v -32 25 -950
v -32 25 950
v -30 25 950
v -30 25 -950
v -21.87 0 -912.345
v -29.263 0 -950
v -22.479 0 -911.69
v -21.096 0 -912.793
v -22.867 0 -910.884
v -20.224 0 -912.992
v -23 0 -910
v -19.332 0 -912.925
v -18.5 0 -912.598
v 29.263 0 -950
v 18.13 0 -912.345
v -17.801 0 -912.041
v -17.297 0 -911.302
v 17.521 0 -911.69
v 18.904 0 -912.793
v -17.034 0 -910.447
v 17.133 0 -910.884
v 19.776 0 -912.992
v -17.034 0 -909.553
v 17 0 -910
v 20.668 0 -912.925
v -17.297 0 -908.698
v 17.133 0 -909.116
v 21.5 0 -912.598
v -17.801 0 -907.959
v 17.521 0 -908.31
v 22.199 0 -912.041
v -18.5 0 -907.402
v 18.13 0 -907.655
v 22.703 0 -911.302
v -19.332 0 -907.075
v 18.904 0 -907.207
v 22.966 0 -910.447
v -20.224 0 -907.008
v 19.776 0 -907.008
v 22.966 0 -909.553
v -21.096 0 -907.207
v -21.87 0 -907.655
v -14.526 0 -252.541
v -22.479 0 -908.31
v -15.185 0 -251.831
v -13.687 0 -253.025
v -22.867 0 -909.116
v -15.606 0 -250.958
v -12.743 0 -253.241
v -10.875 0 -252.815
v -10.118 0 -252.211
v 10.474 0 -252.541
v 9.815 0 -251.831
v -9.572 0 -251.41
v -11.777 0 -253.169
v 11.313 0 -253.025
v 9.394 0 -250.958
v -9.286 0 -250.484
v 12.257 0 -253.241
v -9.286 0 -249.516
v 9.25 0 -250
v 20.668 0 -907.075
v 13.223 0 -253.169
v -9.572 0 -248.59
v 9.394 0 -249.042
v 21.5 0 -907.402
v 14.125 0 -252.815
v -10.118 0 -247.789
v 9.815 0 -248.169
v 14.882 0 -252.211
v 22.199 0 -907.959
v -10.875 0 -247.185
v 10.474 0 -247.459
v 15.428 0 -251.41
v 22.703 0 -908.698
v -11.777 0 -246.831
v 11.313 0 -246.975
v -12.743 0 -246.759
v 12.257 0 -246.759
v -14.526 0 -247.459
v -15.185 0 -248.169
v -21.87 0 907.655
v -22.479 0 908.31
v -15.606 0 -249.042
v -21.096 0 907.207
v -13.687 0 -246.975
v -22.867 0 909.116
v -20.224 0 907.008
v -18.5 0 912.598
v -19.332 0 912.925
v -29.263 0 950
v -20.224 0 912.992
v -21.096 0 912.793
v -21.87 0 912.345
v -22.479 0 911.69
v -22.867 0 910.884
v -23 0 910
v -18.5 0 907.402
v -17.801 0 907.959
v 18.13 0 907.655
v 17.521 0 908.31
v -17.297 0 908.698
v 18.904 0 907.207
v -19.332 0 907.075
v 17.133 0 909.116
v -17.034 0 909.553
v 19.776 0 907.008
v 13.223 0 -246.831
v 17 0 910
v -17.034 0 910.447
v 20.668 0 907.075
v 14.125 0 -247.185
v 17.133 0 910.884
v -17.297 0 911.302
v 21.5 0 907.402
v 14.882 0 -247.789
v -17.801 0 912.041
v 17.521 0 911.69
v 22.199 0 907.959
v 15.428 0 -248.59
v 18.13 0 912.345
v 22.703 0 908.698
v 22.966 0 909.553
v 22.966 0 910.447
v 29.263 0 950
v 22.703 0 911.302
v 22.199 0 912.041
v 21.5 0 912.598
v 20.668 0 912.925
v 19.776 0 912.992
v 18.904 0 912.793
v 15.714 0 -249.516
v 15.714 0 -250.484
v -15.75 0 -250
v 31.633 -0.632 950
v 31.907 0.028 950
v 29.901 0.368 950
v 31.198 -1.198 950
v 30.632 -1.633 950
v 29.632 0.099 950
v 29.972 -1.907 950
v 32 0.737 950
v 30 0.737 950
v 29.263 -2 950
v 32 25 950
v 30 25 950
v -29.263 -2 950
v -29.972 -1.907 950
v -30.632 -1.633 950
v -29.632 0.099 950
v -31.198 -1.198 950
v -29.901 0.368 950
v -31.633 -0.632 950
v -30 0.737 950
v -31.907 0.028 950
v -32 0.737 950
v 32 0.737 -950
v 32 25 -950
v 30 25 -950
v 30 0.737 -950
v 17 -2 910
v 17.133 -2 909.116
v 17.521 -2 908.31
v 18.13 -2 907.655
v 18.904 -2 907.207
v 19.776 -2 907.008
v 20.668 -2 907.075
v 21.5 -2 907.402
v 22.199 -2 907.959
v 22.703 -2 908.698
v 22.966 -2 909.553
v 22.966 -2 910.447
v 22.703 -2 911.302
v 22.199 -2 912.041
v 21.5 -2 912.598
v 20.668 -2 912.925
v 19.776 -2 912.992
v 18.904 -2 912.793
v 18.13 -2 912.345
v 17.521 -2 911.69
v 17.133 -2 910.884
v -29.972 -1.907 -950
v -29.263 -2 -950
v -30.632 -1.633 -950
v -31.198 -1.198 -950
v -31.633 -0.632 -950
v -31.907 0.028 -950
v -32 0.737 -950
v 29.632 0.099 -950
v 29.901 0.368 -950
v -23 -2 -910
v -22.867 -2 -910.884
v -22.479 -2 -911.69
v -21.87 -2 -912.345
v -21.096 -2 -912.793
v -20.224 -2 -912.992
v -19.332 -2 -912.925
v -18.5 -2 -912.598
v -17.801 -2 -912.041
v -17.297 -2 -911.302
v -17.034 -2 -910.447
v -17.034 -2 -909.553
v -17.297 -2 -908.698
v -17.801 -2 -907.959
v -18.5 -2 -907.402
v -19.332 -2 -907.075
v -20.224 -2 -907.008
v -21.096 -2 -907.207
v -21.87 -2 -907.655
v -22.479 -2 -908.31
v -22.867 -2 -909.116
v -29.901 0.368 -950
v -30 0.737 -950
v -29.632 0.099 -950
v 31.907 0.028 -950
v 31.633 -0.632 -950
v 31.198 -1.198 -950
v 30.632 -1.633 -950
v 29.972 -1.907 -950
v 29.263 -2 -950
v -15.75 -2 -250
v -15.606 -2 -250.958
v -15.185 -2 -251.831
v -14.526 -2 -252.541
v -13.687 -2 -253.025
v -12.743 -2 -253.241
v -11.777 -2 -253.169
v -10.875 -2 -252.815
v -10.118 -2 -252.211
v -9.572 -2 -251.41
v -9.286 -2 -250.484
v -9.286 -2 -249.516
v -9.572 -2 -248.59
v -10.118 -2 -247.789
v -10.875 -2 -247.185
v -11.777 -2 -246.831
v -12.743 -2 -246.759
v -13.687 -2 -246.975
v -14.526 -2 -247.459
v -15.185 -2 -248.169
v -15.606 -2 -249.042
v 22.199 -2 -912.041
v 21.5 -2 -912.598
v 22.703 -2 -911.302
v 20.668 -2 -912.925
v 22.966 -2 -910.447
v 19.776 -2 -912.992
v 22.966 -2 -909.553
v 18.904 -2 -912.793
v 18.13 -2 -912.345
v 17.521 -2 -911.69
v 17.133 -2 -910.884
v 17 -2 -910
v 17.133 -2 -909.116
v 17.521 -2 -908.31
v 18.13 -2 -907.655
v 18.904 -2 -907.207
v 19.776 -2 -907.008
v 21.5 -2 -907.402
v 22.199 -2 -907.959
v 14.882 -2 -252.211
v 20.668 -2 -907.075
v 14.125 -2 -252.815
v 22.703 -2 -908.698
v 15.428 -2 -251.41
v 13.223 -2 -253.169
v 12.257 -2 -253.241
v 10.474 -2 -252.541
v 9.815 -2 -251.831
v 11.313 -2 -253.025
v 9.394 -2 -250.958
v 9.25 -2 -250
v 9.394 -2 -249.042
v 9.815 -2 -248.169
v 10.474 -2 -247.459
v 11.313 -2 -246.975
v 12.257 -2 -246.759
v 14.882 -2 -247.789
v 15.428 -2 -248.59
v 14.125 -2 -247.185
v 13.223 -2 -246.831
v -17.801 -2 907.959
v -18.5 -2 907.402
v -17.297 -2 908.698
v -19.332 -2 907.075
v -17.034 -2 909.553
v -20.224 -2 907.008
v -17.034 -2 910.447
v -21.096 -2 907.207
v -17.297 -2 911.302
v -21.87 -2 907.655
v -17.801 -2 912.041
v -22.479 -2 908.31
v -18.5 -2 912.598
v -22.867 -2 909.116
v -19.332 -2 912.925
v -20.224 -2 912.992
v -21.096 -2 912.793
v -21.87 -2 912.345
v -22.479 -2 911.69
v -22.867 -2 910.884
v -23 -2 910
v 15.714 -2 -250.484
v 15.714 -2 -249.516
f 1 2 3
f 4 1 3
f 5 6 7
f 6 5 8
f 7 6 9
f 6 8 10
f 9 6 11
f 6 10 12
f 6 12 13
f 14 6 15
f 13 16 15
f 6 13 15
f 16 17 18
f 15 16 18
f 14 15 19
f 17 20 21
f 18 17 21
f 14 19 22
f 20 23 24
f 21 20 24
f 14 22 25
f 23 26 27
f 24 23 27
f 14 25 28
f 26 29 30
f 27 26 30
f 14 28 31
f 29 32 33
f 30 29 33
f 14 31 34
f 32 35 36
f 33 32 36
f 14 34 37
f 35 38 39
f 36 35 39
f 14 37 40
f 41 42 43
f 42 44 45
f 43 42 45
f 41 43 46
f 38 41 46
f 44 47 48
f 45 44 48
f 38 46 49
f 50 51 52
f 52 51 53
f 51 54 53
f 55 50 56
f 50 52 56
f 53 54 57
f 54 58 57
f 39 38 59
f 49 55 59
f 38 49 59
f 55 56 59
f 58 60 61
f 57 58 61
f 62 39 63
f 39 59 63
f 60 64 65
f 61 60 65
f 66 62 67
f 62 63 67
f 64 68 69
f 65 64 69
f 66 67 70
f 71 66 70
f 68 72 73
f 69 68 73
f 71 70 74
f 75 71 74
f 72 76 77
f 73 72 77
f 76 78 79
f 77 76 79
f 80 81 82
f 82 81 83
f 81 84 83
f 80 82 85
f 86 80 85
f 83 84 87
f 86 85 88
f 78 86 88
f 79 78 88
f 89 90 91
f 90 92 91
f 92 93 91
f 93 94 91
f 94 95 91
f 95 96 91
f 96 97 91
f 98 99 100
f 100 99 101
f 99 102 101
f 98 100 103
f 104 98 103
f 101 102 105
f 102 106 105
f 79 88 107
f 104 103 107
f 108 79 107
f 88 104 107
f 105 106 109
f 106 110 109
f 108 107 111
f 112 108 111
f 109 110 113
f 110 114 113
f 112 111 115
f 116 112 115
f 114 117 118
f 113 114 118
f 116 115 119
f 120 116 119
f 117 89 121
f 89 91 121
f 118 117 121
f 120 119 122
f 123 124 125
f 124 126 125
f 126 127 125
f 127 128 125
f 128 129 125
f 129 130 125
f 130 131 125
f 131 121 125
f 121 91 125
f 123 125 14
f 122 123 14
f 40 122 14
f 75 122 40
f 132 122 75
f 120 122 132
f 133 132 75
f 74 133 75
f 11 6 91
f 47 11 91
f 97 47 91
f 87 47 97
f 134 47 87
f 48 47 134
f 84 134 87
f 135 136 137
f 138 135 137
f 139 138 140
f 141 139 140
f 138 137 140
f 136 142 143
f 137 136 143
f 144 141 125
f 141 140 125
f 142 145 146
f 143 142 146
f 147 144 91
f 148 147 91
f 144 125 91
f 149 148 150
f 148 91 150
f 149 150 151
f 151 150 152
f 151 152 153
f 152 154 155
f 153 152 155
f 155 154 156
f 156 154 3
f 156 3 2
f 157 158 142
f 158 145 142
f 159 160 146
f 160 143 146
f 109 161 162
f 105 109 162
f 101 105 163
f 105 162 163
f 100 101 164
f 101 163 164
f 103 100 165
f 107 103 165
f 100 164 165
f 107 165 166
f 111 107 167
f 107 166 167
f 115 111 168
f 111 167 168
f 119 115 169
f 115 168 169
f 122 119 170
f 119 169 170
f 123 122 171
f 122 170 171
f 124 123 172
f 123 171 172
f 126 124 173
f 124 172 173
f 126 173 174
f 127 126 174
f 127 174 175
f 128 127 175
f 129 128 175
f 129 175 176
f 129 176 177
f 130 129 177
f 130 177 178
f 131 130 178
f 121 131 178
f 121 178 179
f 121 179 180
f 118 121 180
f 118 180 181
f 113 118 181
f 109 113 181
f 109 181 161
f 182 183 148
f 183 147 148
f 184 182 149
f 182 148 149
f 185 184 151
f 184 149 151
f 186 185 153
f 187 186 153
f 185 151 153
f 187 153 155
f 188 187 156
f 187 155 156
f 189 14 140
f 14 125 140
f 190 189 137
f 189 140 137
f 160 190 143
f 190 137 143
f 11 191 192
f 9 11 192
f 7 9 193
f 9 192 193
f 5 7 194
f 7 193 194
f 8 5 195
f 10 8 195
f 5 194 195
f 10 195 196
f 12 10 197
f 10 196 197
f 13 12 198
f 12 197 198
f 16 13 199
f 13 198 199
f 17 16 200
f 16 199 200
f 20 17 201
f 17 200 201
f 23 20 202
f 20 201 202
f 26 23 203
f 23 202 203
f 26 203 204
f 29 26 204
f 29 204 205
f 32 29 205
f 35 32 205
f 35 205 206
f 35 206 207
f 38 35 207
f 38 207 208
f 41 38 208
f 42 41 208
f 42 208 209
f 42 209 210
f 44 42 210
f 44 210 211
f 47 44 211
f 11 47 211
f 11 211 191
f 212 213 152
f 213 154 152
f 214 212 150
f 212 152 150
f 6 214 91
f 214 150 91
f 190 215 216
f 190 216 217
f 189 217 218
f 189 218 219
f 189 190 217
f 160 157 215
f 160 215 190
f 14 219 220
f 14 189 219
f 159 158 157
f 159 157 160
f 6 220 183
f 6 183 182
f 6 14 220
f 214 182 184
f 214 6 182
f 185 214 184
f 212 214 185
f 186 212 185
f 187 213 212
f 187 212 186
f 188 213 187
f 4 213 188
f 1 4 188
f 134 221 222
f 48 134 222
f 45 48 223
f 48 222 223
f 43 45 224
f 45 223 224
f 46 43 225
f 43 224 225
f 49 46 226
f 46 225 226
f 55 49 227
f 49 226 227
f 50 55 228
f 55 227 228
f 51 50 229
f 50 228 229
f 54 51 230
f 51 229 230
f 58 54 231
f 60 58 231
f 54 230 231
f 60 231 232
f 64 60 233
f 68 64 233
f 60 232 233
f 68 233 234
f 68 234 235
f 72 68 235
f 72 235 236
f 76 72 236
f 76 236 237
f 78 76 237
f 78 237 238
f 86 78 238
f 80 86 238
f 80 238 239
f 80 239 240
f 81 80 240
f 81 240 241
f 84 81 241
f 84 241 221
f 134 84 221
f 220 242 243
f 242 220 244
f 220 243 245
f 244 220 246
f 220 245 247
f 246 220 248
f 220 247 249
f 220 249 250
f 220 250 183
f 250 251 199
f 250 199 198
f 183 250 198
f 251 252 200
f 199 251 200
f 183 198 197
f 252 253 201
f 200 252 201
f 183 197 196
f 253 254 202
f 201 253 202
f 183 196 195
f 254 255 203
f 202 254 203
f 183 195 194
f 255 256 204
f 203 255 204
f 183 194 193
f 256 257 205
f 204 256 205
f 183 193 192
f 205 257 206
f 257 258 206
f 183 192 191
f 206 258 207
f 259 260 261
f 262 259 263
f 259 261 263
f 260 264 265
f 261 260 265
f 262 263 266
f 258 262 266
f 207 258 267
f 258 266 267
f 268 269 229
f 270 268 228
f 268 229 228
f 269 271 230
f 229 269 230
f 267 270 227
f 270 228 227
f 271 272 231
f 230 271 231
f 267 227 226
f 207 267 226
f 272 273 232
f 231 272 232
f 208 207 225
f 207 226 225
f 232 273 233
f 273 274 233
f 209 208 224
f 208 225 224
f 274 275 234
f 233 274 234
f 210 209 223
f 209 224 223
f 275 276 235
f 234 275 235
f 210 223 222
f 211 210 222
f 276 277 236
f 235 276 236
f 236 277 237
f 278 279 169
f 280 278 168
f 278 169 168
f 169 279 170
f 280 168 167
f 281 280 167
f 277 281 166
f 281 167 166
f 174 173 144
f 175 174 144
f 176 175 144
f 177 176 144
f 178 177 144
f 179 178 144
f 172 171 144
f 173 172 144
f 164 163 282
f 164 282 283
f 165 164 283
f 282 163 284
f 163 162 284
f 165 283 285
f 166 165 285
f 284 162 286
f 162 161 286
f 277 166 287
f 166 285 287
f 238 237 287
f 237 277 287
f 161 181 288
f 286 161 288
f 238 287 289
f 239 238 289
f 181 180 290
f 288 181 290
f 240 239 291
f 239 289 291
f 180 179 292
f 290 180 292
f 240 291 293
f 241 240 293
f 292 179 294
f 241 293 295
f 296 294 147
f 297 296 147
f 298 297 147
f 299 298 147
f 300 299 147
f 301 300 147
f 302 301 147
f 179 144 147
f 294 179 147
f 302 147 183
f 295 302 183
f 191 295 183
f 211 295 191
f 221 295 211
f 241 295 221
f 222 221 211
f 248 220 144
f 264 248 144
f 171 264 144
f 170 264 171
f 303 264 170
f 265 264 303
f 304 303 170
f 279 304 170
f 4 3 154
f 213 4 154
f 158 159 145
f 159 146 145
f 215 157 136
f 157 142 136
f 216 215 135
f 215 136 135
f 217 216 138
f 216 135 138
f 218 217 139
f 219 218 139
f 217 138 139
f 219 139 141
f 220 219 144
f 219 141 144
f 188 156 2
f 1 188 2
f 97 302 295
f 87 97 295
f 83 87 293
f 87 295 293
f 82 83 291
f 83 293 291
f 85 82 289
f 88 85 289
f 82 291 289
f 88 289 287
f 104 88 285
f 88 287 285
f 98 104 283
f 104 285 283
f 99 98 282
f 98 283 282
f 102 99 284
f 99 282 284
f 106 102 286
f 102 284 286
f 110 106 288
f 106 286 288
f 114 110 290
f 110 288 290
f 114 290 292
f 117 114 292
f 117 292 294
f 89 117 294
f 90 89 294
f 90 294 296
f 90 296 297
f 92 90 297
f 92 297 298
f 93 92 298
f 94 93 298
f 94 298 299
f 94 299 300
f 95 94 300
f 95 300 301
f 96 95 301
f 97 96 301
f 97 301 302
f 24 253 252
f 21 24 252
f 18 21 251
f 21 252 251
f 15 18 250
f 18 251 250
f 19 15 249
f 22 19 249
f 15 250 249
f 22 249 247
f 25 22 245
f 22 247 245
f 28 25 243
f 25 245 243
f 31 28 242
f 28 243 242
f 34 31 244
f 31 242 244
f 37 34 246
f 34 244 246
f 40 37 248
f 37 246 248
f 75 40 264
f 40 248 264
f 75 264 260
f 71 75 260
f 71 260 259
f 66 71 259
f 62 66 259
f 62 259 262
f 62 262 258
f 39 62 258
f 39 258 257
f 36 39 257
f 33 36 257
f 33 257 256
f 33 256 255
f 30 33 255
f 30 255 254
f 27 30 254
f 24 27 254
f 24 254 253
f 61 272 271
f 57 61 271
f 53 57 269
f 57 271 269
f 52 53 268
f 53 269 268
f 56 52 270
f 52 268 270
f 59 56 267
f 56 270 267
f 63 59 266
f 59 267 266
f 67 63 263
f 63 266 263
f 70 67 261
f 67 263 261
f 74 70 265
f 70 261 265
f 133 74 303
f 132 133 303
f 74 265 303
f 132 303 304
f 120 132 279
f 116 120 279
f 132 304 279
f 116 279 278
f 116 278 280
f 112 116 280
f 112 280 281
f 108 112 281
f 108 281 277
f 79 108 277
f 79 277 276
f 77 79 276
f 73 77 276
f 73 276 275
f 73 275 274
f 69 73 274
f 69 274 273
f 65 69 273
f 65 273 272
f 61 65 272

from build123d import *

# Parameters (mm, degrees)
SM_BASE_FLANGE_1_DEPTH    = 950
HOLE_WIZARD_6_0_6_1_D     = 6
HOLE_WIZARD_6_0_6_1_DEPTH = 15
HOLE_WIZARD_6_0_6_1_TIP   = 1.802581857
HOLE_WIZARD_6_5_6_5_1_D   = 6.5


# Sheet-metal steps are written as plain solids
with BuildPart() as part:
    # Sketch 1 → 基体-法兰1 (new, symmetric)
    with BuildSketch(Plane.XY):
        with BuildLine():
            Line((-30, 25), (-30, 0.7366))
            ThreePointArc((-30, 0.7366), (-29.784254855, 0.215745145), (-29.2634, 0))
            Line((-29.2634, 0), (29.2634, 0))
            ThreePointArc((29.2634, 0), (29.784254855, 0.215745145), (30, 0.7366))
            Line((30, 0.7366), (30, 25))
            Line((30, 25), (32, 25))
            Line((32, 25), (32, 0.7366))
            ThreePointArc((32, 0.7366), (31.198468417, -1.198468417), (29.2634, -2))
            Line((29.2634, -2), (-29.2634, -2))
            ThreePointArc((-29.2634, -2), (-31.198468417, -1.198468417), (-32, 0.7366))
            Line((-32, 0.7366), (-32, 25))
            Line((-32, 25), (-30, 25))
        make_face()
    extrude(amount=SM_BASE_FLANGE_1_DEPTH, both=True)

    # Ø6.0 (6) 直径孔1
    with Locations(Plane(origin=(-20, 0, -910), x_dir=(1, 0, 0), z_dir=(0, 1, 0))):
        with Locations((0, 0), (40, 0), (0, -1820), (40, -1820)):
            Hole(HOLE_WIZARD_6_0_6_1_D / 2, depth=HOLE_WIZARD_6_0_6_1_DEPTH)
            with Locations((0, 0, -(HOLE_WIZARD_6_0_6_1_DEPTH + HOLE_WIZARD_6_0_6_1_TIP / 2))):  # 118° drill point
                Cone(0, HOLE_WIZARD_6_0_6_1_D / 2, HOLE_WIZARD_6_0_6_1_TIP, mode=Mode.SUBTRACT)

    # Ø6.5 (6.5) 直径孔1 (through all)
    with Locations(Plane(origin=(-12.5, 0, -250), x_dir=(1, 0, 0), z_dir=(0, 1, 0))):
        with Locations((0, 0), (25, 0)):
            Hole(HOLE_WIZARD_6_5_6_5_1_D / 2)


solid = part.part
